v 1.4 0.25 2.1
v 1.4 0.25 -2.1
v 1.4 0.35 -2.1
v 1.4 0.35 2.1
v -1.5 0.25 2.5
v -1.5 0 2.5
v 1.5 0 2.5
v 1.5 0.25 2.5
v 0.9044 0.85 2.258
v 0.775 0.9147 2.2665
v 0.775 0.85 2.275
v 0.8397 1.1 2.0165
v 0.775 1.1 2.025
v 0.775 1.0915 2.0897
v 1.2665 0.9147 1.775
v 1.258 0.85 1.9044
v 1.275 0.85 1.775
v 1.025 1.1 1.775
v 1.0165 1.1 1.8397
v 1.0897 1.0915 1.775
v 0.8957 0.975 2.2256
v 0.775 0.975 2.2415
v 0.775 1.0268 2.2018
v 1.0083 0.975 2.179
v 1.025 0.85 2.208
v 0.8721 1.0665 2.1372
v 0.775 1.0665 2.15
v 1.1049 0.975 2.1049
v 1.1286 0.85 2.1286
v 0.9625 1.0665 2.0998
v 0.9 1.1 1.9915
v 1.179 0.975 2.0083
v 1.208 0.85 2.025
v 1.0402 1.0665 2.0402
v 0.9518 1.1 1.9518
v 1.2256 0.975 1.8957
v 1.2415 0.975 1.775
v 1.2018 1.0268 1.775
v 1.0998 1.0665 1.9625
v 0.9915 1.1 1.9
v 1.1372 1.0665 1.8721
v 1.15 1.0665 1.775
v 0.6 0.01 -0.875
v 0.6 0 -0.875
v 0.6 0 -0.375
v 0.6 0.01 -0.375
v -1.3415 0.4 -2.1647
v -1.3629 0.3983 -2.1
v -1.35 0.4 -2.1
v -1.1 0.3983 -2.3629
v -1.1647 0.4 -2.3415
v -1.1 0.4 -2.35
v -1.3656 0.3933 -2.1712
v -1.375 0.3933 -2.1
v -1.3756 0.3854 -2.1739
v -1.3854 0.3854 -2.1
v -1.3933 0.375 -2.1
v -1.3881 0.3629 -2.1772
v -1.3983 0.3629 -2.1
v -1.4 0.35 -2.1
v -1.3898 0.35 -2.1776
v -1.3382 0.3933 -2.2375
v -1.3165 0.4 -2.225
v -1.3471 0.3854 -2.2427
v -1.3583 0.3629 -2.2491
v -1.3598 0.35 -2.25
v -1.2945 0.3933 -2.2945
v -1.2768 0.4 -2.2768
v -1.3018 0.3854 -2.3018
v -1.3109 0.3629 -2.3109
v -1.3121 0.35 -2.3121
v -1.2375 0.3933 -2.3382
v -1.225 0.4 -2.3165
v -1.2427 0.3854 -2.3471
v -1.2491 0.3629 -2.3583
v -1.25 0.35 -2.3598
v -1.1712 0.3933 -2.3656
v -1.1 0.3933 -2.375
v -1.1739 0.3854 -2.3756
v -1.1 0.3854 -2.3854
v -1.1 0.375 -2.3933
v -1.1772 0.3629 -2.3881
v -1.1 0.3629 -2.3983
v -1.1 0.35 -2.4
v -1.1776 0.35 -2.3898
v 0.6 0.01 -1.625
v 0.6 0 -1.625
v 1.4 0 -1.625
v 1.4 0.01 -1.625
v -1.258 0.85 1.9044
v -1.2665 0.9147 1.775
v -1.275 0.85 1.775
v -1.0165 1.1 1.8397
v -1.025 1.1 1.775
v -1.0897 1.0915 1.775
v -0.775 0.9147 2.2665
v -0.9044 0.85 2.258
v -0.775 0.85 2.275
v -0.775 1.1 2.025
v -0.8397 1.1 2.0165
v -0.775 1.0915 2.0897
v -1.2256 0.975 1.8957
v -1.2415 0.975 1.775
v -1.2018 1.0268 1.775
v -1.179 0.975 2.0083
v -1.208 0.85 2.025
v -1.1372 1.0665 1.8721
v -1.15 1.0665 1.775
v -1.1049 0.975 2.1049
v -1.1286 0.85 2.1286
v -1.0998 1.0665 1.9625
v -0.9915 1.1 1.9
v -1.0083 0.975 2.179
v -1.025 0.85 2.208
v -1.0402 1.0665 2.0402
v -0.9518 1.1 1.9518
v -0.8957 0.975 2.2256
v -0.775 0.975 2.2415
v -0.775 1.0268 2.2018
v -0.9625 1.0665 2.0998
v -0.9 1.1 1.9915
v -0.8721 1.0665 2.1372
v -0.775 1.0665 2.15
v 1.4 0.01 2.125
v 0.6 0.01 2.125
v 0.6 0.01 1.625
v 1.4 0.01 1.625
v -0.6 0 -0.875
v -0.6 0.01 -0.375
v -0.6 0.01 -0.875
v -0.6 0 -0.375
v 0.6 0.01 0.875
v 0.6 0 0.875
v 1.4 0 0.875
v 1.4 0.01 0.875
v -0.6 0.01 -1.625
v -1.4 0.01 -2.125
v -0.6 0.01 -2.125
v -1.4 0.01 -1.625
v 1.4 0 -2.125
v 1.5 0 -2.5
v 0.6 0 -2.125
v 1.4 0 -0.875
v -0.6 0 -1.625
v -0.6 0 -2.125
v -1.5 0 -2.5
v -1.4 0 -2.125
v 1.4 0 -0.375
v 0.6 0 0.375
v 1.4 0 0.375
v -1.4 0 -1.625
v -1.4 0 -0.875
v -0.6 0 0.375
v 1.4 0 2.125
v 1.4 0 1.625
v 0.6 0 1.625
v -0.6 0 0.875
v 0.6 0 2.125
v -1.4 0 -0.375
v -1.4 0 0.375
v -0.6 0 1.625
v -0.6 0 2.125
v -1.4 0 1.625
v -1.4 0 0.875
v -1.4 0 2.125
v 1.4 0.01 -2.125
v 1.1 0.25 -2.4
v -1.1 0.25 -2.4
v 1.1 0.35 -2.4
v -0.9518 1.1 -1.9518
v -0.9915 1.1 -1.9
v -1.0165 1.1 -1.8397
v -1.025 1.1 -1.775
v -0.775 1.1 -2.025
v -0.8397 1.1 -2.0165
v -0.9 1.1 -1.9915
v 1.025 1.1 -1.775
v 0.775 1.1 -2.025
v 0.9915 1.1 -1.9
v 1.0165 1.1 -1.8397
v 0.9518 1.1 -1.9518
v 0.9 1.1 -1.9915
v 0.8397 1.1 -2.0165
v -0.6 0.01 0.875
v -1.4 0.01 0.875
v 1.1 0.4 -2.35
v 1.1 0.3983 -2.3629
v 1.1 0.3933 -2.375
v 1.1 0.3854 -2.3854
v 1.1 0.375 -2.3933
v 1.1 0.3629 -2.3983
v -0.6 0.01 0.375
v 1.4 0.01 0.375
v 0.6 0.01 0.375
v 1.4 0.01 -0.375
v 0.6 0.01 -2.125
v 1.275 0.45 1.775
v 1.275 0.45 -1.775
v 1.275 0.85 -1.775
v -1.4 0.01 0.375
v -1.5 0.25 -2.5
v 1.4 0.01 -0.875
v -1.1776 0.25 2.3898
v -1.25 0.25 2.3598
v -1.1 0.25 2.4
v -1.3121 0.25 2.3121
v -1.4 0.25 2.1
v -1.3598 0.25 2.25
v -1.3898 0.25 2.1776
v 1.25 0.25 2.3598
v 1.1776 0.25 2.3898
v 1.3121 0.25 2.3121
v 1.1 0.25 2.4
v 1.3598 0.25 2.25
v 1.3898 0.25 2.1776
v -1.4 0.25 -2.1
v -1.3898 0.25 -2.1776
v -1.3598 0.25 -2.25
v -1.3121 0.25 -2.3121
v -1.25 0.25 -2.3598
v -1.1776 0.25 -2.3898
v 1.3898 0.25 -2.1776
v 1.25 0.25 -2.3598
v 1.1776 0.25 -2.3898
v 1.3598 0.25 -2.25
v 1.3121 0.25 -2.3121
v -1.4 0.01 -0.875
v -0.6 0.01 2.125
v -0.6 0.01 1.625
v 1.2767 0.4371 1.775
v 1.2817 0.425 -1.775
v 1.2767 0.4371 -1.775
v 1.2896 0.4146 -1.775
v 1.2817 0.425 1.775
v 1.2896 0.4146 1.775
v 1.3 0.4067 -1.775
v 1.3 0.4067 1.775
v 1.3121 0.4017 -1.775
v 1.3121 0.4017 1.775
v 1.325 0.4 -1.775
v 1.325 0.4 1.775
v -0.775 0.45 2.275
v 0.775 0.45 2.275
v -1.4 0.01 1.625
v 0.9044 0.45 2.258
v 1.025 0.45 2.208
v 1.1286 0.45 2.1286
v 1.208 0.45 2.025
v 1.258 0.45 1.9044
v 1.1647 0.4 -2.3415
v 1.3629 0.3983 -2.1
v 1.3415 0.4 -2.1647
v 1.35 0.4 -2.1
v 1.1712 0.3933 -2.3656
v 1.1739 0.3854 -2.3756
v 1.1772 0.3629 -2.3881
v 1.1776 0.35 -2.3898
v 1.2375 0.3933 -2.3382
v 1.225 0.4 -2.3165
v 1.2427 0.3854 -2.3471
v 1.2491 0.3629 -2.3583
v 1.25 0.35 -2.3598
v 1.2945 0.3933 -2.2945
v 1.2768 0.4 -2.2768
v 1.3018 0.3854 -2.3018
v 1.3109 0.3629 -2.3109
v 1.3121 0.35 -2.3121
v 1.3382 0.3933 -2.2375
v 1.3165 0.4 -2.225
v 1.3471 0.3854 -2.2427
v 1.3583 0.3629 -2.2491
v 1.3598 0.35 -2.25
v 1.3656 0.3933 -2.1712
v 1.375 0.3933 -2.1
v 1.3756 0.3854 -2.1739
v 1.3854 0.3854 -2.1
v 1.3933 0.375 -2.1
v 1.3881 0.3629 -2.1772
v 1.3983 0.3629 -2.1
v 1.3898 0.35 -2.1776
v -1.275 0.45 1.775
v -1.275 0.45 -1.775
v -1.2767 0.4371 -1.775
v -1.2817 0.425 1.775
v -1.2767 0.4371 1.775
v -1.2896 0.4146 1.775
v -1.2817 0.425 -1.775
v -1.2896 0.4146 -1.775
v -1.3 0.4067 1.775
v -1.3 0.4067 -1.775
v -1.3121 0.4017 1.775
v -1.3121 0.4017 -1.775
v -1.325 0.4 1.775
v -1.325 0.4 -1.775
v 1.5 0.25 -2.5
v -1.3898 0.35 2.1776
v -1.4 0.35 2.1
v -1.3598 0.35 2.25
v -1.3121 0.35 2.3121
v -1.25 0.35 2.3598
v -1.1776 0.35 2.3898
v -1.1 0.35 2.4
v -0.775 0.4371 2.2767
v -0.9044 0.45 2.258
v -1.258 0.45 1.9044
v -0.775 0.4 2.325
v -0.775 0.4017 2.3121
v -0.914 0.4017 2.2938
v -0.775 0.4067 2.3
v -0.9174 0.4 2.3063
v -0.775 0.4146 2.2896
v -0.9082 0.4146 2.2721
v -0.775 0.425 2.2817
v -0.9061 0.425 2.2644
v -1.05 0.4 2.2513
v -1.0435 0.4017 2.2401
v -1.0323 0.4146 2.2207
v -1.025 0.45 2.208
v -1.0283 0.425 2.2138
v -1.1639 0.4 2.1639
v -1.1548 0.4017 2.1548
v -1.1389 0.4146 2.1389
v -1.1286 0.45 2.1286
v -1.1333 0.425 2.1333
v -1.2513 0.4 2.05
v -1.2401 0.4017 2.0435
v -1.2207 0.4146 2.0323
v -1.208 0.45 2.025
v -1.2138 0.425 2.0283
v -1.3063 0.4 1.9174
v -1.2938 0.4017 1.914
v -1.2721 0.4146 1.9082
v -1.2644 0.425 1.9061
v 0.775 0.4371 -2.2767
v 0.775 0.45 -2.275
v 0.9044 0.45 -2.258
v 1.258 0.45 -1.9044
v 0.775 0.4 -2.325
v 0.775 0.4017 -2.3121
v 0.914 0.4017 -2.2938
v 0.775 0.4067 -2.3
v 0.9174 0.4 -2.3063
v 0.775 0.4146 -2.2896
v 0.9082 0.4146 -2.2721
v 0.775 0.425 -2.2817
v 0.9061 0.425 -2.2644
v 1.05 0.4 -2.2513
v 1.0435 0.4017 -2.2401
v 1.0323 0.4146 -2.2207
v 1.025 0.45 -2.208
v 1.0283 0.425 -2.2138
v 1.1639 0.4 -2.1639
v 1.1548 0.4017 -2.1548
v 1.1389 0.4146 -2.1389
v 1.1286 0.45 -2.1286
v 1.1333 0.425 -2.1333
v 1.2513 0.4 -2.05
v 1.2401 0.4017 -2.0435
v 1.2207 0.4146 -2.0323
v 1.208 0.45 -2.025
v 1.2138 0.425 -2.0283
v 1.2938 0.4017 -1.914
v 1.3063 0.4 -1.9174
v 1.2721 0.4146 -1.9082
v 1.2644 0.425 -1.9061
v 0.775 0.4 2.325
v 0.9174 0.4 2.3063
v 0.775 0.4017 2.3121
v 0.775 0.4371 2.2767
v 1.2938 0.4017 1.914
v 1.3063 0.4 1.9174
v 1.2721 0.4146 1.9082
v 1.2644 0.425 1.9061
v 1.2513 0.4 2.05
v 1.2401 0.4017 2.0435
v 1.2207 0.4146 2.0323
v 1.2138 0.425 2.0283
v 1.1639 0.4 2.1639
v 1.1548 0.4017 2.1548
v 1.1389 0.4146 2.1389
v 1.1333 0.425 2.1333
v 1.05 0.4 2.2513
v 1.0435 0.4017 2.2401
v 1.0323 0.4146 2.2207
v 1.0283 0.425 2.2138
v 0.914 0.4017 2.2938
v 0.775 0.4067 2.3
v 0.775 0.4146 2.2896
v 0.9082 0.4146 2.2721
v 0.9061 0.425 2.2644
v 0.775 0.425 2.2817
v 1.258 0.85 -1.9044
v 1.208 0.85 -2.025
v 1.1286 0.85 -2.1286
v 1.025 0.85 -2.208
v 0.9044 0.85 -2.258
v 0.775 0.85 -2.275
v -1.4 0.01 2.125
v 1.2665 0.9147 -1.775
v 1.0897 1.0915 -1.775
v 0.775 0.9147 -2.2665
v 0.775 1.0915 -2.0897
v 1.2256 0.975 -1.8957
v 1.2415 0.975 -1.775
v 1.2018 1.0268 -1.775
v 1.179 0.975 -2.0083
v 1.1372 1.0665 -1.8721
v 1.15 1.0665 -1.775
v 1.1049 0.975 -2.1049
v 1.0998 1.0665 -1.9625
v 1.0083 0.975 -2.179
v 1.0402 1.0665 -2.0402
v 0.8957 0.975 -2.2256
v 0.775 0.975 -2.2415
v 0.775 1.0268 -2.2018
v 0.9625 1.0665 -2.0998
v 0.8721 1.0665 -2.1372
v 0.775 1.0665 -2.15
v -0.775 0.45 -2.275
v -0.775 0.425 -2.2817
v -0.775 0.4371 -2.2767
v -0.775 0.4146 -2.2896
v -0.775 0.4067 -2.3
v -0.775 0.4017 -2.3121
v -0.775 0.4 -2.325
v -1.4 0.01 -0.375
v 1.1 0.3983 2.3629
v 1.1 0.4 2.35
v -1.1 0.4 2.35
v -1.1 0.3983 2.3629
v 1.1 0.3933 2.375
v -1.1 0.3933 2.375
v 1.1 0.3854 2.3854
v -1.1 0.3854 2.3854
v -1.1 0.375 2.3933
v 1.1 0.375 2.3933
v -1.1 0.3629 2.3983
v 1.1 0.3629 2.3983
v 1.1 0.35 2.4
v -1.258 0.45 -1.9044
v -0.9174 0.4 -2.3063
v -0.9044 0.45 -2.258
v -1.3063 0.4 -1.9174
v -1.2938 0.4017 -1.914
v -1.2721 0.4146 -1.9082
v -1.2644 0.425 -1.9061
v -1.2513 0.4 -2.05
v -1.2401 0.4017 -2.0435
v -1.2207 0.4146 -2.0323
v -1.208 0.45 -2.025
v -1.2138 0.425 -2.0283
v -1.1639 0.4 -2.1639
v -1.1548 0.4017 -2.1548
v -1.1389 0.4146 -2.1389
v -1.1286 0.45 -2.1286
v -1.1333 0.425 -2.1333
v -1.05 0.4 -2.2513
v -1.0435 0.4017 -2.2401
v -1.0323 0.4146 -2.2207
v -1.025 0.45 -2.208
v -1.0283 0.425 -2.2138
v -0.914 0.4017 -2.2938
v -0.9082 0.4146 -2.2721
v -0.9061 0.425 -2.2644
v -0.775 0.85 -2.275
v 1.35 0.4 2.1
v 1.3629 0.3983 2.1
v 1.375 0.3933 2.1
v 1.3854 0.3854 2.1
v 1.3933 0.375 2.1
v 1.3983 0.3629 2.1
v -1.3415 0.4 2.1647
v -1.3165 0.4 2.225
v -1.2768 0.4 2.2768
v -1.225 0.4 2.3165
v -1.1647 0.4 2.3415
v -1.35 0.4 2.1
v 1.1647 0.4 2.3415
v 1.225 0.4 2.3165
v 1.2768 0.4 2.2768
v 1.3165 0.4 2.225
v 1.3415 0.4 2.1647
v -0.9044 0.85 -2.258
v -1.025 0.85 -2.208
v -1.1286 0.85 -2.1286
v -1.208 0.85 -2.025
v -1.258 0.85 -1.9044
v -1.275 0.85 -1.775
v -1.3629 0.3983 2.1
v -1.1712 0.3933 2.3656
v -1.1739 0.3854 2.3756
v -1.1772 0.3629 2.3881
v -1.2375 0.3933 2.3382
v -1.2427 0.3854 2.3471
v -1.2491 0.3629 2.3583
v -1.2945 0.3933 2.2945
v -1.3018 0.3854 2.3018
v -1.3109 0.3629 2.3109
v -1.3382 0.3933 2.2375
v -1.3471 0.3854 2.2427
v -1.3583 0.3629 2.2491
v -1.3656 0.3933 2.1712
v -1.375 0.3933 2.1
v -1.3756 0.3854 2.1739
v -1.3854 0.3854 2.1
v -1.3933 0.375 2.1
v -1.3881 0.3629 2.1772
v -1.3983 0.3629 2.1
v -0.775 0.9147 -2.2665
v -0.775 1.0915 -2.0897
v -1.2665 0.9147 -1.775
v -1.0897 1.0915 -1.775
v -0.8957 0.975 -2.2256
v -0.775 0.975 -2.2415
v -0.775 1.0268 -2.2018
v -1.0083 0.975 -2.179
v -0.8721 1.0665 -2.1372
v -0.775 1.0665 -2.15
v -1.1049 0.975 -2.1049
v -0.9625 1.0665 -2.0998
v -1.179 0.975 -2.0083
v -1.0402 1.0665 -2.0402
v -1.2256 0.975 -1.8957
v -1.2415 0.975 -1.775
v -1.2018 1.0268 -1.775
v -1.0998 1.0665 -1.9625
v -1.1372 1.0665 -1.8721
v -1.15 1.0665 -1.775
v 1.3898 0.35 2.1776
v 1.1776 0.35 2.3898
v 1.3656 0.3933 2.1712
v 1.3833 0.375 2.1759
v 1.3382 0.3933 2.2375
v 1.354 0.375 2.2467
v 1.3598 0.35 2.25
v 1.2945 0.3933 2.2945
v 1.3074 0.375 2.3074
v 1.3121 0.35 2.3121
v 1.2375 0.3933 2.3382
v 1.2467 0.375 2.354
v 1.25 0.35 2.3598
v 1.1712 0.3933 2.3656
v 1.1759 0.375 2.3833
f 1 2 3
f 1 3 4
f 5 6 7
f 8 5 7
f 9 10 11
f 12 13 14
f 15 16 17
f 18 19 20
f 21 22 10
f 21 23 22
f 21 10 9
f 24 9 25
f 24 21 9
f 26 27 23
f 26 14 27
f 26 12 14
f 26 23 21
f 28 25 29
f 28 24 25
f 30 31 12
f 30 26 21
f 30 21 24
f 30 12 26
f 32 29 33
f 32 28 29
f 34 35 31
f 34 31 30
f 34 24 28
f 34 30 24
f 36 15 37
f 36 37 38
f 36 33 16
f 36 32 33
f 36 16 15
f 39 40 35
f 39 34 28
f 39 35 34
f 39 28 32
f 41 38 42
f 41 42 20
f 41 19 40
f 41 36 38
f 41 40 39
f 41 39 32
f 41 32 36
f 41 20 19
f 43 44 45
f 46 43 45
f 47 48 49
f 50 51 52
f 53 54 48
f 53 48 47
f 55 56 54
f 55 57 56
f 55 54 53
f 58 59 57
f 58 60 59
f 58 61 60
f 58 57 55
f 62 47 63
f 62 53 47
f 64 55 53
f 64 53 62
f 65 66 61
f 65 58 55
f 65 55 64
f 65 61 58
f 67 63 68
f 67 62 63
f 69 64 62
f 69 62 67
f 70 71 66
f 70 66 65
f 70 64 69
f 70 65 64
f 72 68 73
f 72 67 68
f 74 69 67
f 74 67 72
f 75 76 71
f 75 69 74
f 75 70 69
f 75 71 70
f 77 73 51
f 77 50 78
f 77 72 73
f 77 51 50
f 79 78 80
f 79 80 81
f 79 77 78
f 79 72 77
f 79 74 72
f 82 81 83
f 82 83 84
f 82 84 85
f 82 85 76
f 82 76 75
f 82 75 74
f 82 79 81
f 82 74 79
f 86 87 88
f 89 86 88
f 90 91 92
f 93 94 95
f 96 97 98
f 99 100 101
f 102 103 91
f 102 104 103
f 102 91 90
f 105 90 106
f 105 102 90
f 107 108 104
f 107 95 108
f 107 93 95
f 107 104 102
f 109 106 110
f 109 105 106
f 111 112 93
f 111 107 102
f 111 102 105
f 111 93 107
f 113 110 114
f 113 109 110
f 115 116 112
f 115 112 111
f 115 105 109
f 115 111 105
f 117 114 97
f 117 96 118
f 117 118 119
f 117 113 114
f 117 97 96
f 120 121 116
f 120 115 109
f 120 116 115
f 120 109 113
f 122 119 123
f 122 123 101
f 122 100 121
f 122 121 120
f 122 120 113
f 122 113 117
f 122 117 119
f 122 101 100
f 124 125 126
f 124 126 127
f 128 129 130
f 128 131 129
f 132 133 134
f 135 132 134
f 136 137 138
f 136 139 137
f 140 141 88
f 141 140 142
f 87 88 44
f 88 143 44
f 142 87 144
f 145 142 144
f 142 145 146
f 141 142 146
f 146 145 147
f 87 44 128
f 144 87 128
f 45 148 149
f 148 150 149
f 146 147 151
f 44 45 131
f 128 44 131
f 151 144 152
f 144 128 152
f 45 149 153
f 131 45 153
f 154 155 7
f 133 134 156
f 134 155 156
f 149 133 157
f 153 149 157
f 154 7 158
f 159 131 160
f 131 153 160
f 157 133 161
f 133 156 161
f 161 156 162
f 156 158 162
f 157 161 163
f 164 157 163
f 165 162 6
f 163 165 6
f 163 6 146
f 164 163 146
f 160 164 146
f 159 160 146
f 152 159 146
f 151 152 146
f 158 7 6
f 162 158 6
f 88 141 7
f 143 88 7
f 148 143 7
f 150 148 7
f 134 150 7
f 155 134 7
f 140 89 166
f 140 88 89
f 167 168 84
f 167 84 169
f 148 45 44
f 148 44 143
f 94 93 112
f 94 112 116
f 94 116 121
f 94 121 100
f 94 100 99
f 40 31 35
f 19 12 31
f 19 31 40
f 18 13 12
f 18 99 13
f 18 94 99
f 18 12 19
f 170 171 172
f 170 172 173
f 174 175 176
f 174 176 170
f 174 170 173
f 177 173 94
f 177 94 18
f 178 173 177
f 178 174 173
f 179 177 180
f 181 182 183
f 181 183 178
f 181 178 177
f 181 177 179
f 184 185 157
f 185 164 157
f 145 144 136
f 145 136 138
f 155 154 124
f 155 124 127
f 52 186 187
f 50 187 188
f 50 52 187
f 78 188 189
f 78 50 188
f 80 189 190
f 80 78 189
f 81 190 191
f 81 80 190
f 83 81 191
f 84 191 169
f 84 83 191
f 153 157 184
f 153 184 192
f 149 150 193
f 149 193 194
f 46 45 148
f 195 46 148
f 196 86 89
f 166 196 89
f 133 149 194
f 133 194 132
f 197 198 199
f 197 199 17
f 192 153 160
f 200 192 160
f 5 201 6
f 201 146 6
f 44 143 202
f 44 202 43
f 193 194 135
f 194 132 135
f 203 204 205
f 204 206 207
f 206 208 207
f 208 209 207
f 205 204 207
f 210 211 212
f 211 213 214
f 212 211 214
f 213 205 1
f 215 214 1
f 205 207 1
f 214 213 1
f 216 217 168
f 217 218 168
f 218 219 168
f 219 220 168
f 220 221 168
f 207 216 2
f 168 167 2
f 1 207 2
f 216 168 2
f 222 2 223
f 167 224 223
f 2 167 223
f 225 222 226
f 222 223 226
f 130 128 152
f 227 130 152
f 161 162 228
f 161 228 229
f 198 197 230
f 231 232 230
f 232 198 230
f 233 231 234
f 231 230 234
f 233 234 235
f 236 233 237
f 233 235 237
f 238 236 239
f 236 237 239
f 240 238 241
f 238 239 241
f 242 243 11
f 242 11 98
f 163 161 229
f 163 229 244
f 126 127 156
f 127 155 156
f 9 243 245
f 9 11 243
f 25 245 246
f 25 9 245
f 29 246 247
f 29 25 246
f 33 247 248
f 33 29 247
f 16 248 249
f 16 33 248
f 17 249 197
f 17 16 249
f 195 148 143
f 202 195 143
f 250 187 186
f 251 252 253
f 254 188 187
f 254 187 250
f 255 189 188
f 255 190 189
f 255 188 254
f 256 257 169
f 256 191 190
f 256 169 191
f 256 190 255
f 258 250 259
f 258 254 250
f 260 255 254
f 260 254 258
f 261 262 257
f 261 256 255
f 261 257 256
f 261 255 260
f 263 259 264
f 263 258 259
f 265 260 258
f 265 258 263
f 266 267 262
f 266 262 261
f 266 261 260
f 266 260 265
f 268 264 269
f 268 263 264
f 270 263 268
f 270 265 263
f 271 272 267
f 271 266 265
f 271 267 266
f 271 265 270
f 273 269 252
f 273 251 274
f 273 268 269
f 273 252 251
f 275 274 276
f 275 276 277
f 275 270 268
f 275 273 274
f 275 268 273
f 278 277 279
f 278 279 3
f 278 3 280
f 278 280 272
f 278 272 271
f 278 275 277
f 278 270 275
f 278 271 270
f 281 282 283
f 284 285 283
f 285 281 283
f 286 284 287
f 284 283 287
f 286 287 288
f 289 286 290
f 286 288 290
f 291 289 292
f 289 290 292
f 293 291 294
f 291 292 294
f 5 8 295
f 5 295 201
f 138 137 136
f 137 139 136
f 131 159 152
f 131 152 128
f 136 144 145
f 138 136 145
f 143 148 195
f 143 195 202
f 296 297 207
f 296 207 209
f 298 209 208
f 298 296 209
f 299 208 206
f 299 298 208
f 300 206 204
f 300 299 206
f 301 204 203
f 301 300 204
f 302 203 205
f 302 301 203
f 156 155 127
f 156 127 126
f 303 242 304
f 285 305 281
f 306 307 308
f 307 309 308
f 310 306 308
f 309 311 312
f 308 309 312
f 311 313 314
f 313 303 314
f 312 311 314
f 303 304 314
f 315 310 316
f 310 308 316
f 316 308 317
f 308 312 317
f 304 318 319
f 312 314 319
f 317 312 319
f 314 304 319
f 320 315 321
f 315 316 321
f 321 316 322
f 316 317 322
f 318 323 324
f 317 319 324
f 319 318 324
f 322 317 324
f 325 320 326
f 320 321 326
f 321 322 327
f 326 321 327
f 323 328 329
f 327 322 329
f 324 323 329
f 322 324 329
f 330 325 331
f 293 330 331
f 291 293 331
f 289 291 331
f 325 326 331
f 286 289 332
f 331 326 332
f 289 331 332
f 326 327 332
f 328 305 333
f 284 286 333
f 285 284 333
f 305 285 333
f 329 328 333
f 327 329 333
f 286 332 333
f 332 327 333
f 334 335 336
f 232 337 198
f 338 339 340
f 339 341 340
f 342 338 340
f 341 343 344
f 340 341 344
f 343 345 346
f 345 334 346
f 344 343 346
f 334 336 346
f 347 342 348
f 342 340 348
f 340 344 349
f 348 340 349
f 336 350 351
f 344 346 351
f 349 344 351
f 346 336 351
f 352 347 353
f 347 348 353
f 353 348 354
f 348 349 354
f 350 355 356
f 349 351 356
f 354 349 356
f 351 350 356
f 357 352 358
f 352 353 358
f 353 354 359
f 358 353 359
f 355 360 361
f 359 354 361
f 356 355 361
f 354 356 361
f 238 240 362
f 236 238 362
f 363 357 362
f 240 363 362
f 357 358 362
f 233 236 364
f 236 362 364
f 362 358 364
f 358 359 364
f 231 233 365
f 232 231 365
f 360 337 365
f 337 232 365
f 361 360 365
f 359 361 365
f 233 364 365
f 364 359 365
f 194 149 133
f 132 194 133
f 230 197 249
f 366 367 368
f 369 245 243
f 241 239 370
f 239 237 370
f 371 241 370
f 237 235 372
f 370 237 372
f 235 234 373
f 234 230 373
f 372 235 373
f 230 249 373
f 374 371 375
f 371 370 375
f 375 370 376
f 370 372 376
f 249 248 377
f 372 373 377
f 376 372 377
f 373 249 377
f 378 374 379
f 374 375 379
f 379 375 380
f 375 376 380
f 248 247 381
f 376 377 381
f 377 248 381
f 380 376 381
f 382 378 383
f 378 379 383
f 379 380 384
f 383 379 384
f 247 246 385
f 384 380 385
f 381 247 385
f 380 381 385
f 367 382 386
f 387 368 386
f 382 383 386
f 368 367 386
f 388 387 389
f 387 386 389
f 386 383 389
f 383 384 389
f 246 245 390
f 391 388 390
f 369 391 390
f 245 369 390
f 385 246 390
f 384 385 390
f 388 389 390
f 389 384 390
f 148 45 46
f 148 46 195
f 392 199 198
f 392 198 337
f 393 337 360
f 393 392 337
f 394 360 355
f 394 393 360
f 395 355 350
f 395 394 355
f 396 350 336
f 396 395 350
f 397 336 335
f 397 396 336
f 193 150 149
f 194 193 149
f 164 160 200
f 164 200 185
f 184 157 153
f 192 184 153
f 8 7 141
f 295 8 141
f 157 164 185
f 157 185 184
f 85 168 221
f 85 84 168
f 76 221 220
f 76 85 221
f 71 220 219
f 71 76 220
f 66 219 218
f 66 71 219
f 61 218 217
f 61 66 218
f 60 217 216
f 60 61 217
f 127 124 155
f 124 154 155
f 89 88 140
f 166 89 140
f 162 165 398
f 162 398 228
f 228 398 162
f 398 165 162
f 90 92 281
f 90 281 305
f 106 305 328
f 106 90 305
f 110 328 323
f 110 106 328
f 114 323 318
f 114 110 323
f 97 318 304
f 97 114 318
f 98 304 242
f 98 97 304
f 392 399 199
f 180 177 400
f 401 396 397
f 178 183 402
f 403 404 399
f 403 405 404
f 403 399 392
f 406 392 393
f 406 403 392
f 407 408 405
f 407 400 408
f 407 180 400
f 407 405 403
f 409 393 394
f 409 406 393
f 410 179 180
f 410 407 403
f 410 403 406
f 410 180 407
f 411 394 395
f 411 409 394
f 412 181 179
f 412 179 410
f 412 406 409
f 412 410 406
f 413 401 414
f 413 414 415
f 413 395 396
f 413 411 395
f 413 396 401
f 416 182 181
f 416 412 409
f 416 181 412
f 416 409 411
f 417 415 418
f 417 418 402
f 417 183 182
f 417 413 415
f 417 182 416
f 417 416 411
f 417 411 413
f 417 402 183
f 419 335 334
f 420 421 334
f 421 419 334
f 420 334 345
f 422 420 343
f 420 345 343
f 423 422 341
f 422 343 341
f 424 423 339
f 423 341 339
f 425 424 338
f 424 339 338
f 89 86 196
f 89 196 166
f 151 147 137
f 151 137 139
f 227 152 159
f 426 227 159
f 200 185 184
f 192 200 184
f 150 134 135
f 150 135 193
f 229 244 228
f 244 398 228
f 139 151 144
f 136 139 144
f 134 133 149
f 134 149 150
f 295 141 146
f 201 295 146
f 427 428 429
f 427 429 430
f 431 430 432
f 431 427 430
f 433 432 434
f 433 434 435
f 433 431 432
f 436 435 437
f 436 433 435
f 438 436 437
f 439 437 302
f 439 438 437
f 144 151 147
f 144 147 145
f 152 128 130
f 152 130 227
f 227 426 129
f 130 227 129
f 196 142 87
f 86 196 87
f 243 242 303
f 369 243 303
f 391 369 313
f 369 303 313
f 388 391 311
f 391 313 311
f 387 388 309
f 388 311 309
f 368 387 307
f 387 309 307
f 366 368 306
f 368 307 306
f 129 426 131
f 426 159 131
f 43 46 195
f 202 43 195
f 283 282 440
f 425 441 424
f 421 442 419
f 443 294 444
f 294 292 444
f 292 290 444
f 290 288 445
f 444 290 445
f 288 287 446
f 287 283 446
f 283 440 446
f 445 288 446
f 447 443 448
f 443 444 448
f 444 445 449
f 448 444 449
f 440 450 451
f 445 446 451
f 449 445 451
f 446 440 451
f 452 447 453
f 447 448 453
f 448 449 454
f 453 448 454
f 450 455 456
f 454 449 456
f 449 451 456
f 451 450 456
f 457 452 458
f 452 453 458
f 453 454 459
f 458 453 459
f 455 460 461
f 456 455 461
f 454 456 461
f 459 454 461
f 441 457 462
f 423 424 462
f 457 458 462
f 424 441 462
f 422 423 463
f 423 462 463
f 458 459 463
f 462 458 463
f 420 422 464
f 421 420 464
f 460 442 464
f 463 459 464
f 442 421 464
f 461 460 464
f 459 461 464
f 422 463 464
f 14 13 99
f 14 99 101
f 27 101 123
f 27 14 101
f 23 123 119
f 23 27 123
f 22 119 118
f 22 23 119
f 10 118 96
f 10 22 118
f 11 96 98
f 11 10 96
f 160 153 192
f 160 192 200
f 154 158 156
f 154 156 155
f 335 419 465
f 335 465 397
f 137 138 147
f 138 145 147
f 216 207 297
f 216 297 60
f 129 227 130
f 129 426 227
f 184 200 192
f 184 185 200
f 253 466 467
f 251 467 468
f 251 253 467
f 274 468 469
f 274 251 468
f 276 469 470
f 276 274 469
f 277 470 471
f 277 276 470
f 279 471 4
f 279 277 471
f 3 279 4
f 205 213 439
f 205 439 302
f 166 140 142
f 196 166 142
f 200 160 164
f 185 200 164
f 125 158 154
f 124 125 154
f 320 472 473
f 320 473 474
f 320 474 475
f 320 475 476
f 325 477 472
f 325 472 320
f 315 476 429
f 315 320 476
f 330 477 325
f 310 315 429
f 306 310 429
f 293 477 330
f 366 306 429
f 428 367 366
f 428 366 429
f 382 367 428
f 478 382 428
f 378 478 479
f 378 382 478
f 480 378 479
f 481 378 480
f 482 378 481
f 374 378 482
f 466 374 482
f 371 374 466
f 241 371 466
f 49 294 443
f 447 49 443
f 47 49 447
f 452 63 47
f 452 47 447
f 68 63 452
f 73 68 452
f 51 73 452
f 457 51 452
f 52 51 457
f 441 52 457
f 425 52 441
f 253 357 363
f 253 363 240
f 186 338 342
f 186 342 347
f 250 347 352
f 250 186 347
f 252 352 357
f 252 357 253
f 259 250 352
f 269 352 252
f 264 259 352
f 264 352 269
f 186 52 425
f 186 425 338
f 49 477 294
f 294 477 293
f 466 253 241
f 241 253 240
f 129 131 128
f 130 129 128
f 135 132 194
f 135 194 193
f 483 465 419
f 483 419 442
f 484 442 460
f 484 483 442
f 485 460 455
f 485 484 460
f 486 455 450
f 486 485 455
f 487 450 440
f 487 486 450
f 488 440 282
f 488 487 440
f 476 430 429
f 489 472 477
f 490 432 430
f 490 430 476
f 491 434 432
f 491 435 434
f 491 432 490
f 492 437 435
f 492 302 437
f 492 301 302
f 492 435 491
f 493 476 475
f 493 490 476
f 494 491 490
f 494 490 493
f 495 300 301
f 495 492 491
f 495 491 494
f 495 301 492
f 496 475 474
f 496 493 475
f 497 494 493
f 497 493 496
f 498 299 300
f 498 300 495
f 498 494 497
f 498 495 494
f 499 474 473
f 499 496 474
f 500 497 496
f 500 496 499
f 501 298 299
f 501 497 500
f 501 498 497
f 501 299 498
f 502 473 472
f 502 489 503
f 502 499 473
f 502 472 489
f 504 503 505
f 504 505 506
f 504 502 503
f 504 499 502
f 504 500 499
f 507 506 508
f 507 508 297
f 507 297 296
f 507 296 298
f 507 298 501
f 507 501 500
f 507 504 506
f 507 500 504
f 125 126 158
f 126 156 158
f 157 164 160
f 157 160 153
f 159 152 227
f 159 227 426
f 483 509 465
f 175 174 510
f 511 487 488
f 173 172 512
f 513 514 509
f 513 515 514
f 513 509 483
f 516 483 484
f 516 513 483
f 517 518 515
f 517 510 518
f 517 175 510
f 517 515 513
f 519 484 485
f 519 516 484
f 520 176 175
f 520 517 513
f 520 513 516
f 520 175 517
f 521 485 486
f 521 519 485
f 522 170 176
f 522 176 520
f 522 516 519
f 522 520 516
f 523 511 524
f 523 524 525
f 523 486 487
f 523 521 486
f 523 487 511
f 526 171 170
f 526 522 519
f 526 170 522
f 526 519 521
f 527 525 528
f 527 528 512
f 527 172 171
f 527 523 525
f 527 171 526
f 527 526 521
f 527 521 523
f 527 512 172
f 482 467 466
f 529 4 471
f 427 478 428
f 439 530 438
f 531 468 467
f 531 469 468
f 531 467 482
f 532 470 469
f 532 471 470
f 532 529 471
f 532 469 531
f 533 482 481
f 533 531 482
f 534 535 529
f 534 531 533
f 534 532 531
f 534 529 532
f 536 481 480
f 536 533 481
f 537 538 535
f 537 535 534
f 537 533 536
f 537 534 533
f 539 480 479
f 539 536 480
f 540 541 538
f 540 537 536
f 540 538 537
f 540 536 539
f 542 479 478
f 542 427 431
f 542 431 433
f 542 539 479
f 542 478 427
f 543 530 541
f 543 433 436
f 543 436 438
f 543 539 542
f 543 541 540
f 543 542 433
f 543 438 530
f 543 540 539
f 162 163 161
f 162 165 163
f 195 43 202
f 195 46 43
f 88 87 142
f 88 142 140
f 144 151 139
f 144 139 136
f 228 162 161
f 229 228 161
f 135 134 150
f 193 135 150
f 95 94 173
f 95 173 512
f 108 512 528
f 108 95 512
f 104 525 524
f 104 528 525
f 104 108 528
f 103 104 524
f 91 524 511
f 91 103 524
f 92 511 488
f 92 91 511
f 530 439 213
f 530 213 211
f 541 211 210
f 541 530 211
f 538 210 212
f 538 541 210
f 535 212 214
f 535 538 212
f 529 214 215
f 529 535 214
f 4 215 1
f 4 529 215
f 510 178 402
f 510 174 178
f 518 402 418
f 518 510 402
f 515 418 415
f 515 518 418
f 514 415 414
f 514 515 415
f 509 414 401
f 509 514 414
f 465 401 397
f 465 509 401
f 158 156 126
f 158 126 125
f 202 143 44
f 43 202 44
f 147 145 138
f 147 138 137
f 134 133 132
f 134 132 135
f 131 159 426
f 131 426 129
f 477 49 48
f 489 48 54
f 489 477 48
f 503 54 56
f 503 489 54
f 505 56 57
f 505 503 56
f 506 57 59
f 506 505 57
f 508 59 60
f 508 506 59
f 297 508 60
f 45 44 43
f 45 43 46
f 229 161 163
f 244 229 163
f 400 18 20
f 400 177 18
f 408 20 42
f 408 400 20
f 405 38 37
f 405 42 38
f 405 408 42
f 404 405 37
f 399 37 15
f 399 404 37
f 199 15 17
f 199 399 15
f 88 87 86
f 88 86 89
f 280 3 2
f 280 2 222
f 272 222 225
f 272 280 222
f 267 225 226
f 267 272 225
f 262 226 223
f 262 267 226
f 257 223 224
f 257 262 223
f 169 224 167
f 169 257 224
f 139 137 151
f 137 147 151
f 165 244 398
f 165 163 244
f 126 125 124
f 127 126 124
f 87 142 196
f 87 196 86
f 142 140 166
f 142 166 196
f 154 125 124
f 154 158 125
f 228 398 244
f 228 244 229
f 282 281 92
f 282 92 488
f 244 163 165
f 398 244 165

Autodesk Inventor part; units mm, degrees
ref_plane "YZ Plane" through (0, 0, 0) normal (1, 0, 0) x (0, 1, 0)
ref_plane "XZ Plane" through (0, 0, 0) normal (0, 1, 0) x (-1, 0, 0)
ref_plane "XY Plane" through (0, 0, 0) normal (0, 0, 1) x (1, 0, 0)
sketch "Sketch1" plane through (0, 0, 0) normal (0, 1, 0) x (-1, 0, 0)
  line L0 (1.5, 2.5) -> (-1.5, 2.5)
  line L1 (-1.5, 2.5) -> (-1.5, -2.5)
  line L2 (-1.5, -2.5) -> (1.5, -2.5)
  line L3 (1.5, -2.5) -> (1.5, 2.5)
  line L4 (1.5, 2.5) -> (-1.5, -2.5) construction
  line L5 (-1.5, 2.5) -> (1.5, -2.5) construction
  point P0 (0, 0)
  dimension "d1" = 3
  dimension "d2" = 5
extrude "Extrusion1" add sketch "Sketch1" along normal blind 0.25
sketch "Sketch2" plane through (0, 0.25, 0) normal (0, 1, 0) x (1, 0, 0)
  line L0 (1.4, -2.4) -> (-1.4, -2.4)
  line L1 (-1.4, -2.4) -> (-1.4, 2.4)
  line L2 (-1.4, 2.4) -> (1.4, 2.4)
  line L3 (1.4, 2.4) -> (1.4, -2.4)
  line L4 (1.4, -2.4) -> (-1.4, 2.4) construction
  line L5 (-1.4, -2.4) -> (1.4, 2.4) construction
  point P0 (0, 0)
  dimension "d5" = 4.8
  dimension "d6" = 2.8
extrude "Extrusion2" add sketch "Sketch2" along normal blind 0.15 separate body
sketch "Sketch3" plane through (0, 0.4, 0) normal (0, 1, 0) x (1, 0, 0)
  line L0 (1.275, -2.275) -> (-1.275, -2.275)
  line L1 (-1.275, -2.275) -> (-1.275, 2.275)
  line L2 (-1.275, 2.275) -> (1.275, 2.275)
  line L3 (1.275, 2.275) -> (1.275, -2.275)
  line L4 (1.275, -2.275) -> (-1.275, 2.275) construction
  line L5 (-1.275, -2.275) -> (1.275, 2.275) construction
  point P0 (0, 0)
  dimension "d9" = 4.55
  dimension "d10" = 2.55
extrude "Extrusion3" add sketch "Sketch3" along normal blind 0.7 bodies 2
sketch "Sketch4" plane through (0, 0, 0) normal (0, -1, 0) x (1, 0, 0)
  line L0 (1.4, -2.125) -> (0.6, -2.125)
  line L1 (0.6, -2.125) -> (0.6, -1.625)
  line L2 (0.6, -1.625) -> (1.4, -1.625)
  line L3 (1.4, -1.625) -> (1.4, -2.125)
  line L4 (1.4, -2.125) -> (0.6, -1.625) construction
  line L5 (0.6, -2.125) -> (1.4, -1.625) construction
  point P0 (0, 0)
  point P1 (1, -1.875)
  dimension "d13" = 0.8
  dimension "d14" = 0.5
  dimension "d15" = 1.875
  dimension "d16" = 1
extrude "Extrusion4" cut sketch "Sketch4" against normal blind 0.01 bodies 1
pattern_linear "Rectangular Pattern1" count 4 spacing 1.25 along (0, 0, 1) count 2 spacing 2 along (-1, 0, 0) of "Extrusion4" bodies 1
extrude "Extrusion5" add sketch "Sketch4" against normal blind 0.01 separate body
pattern_linear "Rectangular Pattern2" count 4 spacing 1.25 along (0, 0, 1) count 2 spacing 2 along (-1, 0, 0) of "Extrusion5" bodies 3
fillet "Fillet1" radius 0.5 4 edges at (-1.275, 0.75, -2.275) (1.275, 0.75, -2.275) (-1.275, 0.75, 2.275) (1.275, 0.75, 2.275)
fillet "Fillet2" radius 0.3 4 edges at (-1.4, 0.325, -2.4) (1.4, 0.325, -2.4) (-1.4, 0.325, 2.4) (1.4, 0.325, 2.4)
fillet "Fillet4" radius 0.25 8 edges at (-1.1286, 1.1, 2.1286) (0, 1.1, 2.275) (1.1286, 1.1, 2.1286) (1.275, 1.1, 0) (1.1286, 1.1, -2.1286) (0, 1.1, -2.275) (-1.1286, 1.1, -2.1286) (-1.275, 1.1, 0)
fillet "Fillet5" radius 0.05 16 edges at (1.3121, 0.4, 2.3121) (1.4, 0.4, 0) (1.3121, 0.4, -2.3121) (0, 0.4, -2.4) (-1.3121, 0.4, -2.3121) (-1.4, 0.4, 0) (-1.3121, 0.4, 2.3121) (0, 0.4, 2.4) (0, 0.4, 2.275) (1.1286, 0.4, 2.1286) (1.275, 0.4, 0) (1.1286, 0.4, -2.1286) (0, 0.4, -2.275) (-1.1286, 0.4, -2.1286) (-1.275, 0.4, 0) (-1.1286, 0.4, 2.1286)
properties part number "LGA"
